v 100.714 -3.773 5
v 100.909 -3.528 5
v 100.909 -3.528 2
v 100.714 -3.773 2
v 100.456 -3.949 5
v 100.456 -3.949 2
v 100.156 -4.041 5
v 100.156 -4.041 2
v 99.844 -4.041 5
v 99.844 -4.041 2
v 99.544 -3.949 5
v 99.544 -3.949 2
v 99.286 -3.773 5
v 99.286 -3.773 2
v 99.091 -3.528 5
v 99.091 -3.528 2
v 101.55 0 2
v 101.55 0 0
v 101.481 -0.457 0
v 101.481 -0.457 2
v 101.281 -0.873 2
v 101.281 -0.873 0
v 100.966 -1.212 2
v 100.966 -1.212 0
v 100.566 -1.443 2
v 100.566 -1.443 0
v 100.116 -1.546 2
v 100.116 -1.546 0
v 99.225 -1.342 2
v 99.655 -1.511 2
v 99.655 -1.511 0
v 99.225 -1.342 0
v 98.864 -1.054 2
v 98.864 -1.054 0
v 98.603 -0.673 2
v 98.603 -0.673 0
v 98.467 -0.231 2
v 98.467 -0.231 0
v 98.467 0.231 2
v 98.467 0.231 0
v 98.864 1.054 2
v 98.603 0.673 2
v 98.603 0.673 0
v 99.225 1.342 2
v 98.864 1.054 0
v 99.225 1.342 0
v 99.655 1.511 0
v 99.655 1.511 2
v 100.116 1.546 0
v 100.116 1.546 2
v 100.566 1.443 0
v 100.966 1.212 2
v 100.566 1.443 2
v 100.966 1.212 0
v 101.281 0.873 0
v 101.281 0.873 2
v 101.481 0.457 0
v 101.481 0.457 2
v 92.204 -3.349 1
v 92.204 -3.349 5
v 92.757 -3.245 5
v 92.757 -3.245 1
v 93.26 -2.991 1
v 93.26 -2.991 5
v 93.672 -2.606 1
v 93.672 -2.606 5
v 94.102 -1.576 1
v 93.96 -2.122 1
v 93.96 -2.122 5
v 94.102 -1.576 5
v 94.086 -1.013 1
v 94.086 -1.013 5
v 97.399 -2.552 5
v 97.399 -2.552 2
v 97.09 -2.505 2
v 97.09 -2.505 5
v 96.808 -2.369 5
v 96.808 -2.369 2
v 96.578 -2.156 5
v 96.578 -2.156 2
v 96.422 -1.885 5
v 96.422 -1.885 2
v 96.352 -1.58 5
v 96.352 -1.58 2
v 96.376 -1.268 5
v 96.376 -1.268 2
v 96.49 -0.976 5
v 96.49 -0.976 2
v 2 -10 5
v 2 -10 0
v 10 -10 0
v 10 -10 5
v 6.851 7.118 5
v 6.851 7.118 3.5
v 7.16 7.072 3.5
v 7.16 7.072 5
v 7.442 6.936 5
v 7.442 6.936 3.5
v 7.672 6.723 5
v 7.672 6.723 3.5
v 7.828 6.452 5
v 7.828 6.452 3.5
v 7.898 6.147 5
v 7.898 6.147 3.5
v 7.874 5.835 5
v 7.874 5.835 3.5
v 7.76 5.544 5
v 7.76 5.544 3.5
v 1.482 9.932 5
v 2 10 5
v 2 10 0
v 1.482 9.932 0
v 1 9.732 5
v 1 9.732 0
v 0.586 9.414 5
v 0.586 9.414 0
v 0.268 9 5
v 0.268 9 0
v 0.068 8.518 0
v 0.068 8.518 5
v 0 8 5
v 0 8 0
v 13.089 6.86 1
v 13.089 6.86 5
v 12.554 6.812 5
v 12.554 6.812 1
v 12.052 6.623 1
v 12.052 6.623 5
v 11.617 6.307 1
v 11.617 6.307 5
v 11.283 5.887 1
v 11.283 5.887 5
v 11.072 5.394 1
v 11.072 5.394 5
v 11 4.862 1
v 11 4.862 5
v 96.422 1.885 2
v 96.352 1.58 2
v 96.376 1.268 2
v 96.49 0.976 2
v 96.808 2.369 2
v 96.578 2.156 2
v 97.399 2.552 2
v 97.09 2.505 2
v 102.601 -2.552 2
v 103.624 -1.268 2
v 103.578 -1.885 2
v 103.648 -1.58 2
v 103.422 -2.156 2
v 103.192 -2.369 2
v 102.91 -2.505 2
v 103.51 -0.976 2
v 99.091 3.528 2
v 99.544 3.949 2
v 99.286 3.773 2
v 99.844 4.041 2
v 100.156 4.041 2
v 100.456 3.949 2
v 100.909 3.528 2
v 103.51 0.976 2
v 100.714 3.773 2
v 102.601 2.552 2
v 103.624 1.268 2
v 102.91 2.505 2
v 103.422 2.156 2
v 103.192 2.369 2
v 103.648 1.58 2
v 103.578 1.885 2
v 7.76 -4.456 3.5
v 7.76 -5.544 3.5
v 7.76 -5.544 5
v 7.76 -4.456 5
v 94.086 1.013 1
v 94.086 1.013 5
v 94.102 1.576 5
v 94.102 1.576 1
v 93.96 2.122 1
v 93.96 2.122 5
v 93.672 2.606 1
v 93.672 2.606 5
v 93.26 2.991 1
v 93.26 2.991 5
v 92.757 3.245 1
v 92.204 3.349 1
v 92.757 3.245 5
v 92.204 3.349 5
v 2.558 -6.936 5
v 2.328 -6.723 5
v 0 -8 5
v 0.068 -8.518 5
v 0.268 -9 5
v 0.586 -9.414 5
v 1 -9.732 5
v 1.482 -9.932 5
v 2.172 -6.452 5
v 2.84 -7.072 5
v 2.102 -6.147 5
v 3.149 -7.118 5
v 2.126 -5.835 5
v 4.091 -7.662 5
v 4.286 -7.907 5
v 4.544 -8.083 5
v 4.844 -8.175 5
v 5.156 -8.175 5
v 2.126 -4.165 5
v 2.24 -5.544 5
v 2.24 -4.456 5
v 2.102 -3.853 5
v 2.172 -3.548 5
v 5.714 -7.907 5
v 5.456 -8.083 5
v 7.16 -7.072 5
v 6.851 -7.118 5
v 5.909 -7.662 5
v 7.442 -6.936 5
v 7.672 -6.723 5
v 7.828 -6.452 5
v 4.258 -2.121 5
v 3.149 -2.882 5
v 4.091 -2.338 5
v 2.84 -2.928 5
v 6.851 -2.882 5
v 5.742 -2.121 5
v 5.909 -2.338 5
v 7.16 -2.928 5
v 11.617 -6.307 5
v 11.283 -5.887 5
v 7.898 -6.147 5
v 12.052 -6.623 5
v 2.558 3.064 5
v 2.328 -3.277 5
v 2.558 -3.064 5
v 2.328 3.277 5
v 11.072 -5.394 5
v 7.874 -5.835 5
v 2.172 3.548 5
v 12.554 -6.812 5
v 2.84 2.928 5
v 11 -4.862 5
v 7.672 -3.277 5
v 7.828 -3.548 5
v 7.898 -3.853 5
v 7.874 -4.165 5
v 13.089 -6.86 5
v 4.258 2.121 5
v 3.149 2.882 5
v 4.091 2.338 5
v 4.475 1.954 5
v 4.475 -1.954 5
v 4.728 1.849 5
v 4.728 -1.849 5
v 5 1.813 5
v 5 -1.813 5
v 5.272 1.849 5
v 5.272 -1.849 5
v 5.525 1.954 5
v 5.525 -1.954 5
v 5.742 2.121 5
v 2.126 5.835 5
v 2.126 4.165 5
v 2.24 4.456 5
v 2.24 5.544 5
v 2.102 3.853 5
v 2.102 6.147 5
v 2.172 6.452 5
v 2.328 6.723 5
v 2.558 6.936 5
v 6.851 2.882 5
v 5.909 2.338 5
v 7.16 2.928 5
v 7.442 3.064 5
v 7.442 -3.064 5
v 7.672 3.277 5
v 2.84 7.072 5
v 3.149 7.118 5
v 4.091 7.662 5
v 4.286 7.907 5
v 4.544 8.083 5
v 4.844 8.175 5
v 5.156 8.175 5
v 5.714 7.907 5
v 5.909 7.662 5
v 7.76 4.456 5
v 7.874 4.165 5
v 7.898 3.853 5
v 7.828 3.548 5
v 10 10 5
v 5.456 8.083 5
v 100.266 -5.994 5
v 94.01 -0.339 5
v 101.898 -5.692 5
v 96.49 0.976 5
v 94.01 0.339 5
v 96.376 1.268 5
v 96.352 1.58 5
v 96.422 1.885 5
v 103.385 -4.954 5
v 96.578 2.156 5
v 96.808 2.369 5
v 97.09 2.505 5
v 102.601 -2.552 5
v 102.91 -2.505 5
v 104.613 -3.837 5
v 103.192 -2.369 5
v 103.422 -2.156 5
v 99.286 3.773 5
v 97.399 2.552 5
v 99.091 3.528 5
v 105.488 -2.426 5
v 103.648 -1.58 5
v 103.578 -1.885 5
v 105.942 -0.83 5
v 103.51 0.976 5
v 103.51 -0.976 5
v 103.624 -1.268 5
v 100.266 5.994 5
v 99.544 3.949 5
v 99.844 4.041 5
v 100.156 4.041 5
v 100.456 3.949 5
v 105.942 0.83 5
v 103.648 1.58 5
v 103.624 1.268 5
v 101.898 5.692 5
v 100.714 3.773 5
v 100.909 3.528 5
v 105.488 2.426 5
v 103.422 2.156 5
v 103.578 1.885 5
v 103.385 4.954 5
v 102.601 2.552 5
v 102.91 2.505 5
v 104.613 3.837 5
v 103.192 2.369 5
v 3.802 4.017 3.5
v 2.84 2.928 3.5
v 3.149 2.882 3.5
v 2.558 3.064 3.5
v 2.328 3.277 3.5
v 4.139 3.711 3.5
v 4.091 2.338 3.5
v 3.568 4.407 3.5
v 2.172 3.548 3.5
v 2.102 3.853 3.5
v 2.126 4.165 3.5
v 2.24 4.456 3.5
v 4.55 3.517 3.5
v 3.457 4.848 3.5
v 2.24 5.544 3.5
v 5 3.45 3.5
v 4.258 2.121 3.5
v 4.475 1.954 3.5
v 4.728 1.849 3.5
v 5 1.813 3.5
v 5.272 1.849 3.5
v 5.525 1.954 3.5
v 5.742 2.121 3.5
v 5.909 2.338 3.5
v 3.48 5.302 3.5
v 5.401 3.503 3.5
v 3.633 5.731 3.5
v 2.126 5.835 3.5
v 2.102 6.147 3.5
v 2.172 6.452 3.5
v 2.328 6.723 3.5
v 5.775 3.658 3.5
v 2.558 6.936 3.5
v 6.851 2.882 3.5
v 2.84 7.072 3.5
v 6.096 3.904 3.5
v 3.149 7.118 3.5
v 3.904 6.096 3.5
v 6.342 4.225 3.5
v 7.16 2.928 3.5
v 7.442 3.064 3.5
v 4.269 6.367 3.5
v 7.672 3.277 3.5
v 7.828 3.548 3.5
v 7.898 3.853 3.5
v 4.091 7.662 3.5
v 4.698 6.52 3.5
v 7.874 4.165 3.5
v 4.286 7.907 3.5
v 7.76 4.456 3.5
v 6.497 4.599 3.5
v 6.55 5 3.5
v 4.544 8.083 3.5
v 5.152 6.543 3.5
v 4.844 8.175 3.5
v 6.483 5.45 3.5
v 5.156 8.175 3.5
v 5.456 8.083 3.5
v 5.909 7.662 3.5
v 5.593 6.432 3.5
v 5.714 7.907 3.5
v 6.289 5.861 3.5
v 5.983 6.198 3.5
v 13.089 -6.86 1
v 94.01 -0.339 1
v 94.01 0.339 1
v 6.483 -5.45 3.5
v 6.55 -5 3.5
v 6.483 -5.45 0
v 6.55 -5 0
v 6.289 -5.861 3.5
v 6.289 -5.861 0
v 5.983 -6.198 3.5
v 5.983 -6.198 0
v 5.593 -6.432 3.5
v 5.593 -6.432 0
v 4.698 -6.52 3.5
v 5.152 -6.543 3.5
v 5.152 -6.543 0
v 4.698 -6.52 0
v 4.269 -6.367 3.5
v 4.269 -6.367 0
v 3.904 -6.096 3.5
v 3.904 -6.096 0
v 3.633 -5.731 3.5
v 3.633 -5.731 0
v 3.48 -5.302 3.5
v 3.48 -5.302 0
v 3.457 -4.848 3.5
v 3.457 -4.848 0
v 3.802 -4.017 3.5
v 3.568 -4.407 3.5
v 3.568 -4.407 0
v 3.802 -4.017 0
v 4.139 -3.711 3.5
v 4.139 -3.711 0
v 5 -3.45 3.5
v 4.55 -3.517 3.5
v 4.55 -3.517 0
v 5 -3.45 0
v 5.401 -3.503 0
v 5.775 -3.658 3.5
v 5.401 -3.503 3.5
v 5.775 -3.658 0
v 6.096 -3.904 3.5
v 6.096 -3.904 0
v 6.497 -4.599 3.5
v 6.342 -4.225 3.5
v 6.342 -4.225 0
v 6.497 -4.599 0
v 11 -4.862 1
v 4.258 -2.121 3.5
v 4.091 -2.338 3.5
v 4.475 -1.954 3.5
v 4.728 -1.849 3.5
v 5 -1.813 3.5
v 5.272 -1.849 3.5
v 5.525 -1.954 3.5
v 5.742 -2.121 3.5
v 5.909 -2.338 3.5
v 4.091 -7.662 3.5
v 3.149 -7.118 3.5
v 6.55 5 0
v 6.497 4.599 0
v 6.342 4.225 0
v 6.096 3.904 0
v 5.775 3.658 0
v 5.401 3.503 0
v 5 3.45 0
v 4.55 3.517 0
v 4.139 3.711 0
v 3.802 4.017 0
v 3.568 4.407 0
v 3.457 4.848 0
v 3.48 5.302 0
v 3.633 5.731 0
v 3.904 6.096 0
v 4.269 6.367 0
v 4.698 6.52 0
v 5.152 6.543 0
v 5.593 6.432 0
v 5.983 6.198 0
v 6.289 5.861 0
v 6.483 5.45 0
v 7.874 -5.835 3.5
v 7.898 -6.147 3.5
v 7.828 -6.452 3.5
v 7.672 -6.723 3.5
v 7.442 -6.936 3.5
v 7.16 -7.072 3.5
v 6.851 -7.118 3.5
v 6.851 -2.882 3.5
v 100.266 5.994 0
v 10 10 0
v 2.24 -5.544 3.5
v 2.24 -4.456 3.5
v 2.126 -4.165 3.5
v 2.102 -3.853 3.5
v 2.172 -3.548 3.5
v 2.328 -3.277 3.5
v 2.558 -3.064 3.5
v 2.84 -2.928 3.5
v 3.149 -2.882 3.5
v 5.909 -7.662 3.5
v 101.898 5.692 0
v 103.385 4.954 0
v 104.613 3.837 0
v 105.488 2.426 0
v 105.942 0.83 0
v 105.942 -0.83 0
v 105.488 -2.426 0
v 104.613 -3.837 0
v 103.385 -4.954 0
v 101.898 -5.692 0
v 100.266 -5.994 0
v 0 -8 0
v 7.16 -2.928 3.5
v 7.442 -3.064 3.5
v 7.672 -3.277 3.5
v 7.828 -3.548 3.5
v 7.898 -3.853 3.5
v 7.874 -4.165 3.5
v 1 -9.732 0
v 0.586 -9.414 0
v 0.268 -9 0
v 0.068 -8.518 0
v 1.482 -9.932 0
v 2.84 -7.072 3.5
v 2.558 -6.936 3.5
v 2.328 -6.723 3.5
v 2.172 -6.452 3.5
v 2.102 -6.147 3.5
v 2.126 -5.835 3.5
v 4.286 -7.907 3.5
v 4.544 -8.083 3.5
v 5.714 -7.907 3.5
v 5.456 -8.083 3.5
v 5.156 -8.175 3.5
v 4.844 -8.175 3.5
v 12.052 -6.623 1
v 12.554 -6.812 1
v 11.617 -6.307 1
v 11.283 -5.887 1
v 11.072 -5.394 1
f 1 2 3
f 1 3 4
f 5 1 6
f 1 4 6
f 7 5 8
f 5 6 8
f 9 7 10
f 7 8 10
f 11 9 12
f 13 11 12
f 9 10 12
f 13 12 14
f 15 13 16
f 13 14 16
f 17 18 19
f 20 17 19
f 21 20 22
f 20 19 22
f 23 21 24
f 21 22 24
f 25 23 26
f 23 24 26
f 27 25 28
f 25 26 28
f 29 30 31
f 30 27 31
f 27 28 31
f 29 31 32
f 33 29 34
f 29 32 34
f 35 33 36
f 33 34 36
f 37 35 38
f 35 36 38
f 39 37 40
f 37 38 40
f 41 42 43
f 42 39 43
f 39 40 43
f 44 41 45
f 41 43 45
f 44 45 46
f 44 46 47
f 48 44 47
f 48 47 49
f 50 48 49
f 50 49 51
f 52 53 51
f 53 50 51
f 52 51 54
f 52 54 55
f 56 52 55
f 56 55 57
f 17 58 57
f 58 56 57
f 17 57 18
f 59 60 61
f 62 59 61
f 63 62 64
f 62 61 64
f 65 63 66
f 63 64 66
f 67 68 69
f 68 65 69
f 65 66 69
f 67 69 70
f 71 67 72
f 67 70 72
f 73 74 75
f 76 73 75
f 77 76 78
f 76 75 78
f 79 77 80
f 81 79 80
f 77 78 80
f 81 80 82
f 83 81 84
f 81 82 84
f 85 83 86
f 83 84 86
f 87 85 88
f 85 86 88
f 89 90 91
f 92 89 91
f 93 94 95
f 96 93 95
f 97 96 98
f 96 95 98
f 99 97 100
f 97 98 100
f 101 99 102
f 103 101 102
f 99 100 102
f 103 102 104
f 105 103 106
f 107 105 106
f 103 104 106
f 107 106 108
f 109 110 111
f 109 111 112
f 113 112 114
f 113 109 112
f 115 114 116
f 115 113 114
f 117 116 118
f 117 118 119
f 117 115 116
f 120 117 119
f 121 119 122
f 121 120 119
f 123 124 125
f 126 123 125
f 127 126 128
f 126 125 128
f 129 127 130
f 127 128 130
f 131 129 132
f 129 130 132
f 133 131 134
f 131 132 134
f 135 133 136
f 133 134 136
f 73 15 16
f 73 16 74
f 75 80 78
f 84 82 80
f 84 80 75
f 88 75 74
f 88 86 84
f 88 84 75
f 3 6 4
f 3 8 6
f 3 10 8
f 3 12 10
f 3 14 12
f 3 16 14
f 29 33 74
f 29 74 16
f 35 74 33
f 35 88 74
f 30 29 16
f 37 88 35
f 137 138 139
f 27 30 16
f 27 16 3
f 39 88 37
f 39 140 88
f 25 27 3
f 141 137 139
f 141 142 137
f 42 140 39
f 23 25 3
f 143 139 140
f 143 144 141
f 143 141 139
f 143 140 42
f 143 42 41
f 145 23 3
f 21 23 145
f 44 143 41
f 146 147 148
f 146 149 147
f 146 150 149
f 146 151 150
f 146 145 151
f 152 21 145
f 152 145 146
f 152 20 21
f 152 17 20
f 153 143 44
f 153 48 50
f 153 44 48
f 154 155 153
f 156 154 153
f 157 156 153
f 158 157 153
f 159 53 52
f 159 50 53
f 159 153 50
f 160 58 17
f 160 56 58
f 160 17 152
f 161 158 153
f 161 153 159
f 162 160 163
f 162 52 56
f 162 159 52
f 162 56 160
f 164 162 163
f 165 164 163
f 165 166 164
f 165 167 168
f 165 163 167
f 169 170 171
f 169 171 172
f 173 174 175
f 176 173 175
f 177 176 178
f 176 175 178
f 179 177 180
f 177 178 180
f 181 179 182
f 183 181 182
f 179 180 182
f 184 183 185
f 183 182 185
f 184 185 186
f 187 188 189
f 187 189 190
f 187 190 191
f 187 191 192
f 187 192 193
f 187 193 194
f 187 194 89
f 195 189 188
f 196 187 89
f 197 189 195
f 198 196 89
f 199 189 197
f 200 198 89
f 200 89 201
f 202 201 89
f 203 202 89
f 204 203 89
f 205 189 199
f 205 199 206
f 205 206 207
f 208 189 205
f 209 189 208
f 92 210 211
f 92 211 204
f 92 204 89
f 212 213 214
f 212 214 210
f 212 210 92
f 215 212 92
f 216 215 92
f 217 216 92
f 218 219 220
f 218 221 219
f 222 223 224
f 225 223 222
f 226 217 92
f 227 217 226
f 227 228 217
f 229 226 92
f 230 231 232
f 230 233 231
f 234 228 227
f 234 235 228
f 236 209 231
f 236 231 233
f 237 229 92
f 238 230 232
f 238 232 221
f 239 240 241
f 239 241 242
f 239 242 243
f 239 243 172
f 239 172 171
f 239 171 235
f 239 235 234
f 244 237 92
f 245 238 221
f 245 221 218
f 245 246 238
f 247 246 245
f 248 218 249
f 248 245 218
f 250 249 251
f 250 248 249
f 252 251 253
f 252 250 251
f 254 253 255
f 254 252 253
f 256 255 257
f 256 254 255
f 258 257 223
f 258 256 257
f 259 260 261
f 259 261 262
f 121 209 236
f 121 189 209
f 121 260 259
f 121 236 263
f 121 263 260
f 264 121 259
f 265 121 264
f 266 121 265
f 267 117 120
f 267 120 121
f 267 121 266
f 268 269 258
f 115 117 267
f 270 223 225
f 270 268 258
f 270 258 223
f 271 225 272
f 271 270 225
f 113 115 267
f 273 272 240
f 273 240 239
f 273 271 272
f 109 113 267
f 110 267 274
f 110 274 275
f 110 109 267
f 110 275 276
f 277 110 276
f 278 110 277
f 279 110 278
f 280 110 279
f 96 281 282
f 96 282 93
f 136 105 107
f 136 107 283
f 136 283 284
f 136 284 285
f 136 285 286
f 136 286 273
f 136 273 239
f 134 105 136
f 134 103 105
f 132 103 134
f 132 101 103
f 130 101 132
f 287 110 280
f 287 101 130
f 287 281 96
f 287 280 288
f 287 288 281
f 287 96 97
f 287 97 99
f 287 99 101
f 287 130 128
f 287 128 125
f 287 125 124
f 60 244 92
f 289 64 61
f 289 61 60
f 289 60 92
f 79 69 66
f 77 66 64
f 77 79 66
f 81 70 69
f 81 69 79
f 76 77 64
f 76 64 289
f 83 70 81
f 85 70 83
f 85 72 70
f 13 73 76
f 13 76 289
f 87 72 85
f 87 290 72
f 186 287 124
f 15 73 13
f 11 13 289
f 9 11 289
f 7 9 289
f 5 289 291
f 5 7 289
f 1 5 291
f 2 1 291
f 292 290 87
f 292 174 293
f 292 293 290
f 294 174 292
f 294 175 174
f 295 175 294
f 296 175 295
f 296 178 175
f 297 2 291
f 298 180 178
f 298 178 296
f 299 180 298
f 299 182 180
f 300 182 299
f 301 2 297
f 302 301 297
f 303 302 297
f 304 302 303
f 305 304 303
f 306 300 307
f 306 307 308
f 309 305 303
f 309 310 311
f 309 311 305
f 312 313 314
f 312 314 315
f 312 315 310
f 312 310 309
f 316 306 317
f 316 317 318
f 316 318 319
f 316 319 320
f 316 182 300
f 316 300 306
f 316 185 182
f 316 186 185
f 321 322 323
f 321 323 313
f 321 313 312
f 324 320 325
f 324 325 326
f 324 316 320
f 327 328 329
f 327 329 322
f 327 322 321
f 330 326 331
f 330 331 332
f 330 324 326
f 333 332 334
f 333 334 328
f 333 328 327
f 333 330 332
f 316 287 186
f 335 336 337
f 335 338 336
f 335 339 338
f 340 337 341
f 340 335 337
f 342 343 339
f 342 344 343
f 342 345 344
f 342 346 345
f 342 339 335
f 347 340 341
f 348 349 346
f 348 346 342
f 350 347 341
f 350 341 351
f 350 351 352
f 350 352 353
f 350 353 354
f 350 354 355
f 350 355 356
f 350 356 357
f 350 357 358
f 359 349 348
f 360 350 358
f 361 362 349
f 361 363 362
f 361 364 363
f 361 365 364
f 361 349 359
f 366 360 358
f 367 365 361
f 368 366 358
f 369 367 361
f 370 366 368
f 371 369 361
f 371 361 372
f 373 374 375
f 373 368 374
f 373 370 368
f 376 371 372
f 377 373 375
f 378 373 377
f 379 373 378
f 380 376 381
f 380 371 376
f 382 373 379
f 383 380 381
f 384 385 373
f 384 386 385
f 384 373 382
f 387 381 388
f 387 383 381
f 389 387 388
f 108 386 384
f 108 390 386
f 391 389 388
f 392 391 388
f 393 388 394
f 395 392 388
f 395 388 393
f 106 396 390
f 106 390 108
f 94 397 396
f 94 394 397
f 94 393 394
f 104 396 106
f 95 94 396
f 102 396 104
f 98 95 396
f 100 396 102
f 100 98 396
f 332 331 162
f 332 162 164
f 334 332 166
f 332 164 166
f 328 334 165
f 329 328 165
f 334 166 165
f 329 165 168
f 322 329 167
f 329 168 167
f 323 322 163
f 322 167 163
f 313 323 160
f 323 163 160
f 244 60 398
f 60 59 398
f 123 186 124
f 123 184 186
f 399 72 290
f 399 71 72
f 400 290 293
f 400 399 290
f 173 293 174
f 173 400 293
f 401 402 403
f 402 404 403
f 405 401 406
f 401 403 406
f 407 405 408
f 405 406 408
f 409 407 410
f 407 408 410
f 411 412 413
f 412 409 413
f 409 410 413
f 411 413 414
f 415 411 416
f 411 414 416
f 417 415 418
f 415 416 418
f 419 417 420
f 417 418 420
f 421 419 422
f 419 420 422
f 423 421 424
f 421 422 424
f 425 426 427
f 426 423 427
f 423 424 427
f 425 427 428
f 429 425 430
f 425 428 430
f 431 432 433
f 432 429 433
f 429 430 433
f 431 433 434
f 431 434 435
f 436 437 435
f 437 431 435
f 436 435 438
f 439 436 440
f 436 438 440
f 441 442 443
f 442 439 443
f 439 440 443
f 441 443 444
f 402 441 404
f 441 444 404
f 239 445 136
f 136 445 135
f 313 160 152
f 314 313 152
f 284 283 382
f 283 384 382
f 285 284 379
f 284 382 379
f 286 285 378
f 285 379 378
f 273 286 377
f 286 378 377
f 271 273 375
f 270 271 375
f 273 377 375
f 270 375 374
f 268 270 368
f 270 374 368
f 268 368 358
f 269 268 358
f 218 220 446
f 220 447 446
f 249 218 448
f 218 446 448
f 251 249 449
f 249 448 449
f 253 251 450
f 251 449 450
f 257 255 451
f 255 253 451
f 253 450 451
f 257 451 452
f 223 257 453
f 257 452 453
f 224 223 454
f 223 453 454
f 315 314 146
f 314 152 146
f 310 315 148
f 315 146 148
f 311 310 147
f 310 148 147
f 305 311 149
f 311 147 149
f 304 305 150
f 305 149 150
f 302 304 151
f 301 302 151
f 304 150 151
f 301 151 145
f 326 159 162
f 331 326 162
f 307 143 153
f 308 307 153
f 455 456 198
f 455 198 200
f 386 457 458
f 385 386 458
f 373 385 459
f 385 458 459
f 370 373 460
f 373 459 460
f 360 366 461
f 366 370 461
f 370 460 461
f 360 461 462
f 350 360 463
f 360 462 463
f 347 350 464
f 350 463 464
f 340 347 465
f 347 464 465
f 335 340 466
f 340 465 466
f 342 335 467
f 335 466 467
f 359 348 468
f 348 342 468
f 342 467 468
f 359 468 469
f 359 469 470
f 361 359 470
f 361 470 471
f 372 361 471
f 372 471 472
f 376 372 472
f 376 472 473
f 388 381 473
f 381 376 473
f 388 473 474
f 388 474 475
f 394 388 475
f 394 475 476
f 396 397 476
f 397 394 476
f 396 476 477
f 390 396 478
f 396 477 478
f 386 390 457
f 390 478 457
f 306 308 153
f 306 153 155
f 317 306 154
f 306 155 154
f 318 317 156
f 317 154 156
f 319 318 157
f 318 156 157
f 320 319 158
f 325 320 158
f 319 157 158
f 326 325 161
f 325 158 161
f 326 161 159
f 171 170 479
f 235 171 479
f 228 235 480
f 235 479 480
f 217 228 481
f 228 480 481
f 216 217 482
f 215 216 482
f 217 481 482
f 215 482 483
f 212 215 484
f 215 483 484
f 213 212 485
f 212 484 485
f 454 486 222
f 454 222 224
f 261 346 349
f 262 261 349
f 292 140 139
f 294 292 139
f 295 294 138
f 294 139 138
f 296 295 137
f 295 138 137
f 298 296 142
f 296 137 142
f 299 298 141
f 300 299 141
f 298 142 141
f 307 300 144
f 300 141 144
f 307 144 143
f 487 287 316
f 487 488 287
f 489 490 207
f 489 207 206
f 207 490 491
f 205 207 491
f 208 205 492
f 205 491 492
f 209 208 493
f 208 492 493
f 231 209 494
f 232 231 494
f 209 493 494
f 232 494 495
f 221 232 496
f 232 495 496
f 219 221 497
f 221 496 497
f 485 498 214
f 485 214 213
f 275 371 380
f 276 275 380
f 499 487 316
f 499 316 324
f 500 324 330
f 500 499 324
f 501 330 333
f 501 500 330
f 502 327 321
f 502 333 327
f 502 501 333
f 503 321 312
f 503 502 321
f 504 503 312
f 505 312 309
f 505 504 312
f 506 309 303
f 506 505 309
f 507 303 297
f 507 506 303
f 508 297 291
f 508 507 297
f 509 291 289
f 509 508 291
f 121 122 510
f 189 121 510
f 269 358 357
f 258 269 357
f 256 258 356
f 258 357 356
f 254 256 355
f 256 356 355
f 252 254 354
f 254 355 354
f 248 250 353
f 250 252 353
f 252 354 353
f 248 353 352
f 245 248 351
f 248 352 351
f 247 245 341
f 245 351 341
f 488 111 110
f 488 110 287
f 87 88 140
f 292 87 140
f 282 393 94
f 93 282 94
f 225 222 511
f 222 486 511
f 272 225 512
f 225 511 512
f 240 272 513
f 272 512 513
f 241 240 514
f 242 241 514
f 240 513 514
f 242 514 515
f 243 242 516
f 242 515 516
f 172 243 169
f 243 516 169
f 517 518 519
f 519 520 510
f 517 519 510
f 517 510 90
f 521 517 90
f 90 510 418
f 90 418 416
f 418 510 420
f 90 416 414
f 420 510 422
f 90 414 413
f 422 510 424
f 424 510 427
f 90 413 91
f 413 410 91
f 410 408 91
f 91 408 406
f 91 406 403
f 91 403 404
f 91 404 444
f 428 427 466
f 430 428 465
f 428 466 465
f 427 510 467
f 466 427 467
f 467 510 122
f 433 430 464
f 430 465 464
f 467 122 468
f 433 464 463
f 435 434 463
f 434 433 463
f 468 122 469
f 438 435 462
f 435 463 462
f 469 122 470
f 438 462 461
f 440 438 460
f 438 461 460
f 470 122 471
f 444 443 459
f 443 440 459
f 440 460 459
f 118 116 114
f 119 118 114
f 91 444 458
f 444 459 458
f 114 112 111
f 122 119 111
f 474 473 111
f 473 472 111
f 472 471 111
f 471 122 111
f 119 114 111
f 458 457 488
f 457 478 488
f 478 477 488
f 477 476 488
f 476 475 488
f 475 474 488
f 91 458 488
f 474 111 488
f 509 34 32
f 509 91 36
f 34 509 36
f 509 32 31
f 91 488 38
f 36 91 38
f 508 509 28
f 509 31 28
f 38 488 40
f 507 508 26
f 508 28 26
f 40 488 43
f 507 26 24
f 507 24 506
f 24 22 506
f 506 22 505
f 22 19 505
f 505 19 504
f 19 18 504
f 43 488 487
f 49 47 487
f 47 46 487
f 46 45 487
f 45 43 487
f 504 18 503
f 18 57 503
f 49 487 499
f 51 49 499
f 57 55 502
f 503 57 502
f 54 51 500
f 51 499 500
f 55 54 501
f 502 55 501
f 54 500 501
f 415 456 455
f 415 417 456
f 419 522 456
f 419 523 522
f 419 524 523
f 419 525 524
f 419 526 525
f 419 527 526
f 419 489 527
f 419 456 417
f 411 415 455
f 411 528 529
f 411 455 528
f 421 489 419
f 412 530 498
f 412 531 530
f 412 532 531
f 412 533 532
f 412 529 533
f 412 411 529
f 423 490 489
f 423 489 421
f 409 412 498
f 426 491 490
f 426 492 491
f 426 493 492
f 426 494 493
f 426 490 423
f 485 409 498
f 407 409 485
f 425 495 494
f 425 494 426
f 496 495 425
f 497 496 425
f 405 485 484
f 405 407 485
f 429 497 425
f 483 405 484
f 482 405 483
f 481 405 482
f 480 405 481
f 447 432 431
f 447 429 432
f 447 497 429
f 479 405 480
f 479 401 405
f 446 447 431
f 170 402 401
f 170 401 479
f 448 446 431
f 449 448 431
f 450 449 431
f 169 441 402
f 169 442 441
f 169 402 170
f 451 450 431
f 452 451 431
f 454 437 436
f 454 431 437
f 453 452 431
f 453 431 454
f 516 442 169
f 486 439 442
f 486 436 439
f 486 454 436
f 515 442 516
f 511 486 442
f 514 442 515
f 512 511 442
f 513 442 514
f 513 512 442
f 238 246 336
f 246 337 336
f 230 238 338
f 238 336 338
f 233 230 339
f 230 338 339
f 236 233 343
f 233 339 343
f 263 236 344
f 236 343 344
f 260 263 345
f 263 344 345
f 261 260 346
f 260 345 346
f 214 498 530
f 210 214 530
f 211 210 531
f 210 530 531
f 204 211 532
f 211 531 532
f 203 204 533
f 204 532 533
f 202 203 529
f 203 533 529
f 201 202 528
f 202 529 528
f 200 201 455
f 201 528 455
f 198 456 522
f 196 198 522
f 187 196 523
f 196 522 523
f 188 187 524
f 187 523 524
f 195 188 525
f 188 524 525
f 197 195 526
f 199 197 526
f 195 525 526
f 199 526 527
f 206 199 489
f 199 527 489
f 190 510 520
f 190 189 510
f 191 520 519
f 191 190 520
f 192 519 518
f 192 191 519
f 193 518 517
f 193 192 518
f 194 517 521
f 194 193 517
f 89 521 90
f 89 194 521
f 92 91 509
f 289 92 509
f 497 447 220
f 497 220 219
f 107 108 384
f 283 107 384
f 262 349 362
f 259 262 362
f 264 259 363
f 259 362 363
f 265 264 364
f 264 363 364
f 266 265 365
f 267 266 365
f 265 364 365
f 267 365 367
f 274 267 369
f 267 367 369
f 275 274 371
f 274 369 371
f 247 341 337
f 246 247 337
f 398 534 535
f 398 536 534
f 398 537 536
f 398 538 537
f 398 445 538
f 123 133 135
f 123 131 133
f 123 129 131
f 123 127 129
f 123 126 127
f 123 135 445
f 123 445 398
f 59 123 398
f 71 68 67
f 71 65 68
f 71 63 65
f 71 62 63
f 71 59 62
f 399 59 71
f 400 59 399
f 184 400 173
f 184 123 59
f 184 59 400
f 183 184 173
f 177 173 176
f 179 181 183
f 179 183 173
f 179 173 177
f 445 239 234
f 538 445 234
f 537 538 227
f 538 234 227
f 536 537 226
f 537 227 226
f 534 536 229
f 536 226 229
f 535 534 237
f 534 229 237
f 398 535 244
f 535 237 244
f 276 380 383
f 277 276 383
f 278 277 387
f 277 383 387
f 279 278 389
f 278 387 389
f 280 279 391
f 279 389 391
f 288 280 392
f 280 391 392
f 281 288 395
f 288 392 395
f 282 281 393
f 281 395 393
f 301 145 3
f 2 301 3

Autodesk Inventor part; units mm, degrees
ref_plane "YZ Plane" through (0, 0, 0) normal (1, 0, 0) x (0, 1, 0)
ref_plane "XZ Plane" through (0, 0, 0) normal (0, 1, 0) x (-1, 0, 0)
ref_plane "XY Plane" through (0, 0, 0) normal (0, 0, 1) x (1, 0, 0)
sketch "スケッチ1" plane through (0, 0, 0) normal (0, 0, 1) x (1, 0, 0)
  circle A0 centre (5, 5) radius 1.55
  circle A1 centre (5, -5) radius 1.55
  line L0 (0, 0) -> (100, 0) construction
  circle A2 centre (100, 0) radius 1.55
  line L1 (0, 10) -> (0, -10)
  line L2 (0, -10) -> (10, -10)
  line L3 (10, -10) -> (100.266, -5.9941)
  line L4 (10, 10) -> (100.266, 5.9941)
  arc A3 (100.266, -5.9941) -> (100.266, 5.9941) centre (100, 0) ccw
  line L5 (94.942, -3.2274) -> (11, -6.9527)
  line L6 (94.942, 3.2274) -> (11, 6.9527)
  arc A4 (94.942, 3.2274) -> (94.942, -3.2274) centre (100, 0) ccw
  line L7 (11, -6.9527) -> (11, 6.9527)
  line L8 (5, -5) -> (5, 5)
  line L9 (0, 10) -> (10, 10)
  line L10 (7.76, 6.5935) -> (7.76, 3.4065)
  line L11 (7.76, 3.4065) -> (5, 1.813)
  line L12 (5, 1.813) -> (2.24, 3.4065)
  line L13 (2.24, 3.4065) -> (2.24, 6.5935)
  line L14 (2.24, 6.5935) -> (5, 8.187)
  line L15 (5, 8.187) -> (7.76, 6.5935)
  arc A5 (4.0907, 2.338) -> (5.9093, 2.338) centre (5, 2.863) ccw
  arc A6 (6.8507, 2.8815) -> (7.76, 4.4565) centre (6.8507, 3.9315) ccw
  arc A7 (7.76, 5.5435) -> (6.8507, 7.1185) centre (6.8507, 6.0685) ccw
  arc A8 (5.9093, 7.662) -> (4.0907, 7.662) centre (5, 7.137) ccw
  arc A9 (3.1493, 7.1185) -> (2.24, 5.5435) centre (3.1493, 6.0685) ccw
  arc A10 (2.24, 4.4565) -> (3.1493, 2.8815) centre (3.1493, 3.9315) ccw
  line L16 (7.76, -6.5935) -> (7.76, -3.4065)
  line L17 (7.76, -3.4065) -> (5, -1.813)
  line L18 (5, -1.813) -> (2.24, -3.4065)
  line L19 (2.24, -3.4065) -> (2.24, -6.5935)
  line L20 (2.24, -6.5935) -> (5, -8.187)
  line L21 (5, -8.187) -> (7.76, -6.5935)
  arc A11 (5.9093, -2.338) -> (4.0907, -2.338) centre (5, -2.863) ccw
  arc A12 (7.76, -4.4565) -> (6.8507, -2.8815) centre (6.8507, -3.9315) ccw
  arc A13 (6.8507, -7.1185) -> (7.76, -5.5435) centre (6.8507, -6.0685) ccw
  arc A14 (4.0907, -7.662) -> (5.9093, -7.662) centre (5, -7.137) ccw
  arc A15 (2.24, -5.5435) -> (3.1493, -7.1185) centre (3.1493, -6.0685) ccw
  arc A16 (3.1493, -2.8815) -> (2.24, -4.4565) centre (3.1493, -3.9315) ccw
  circle A17 centre (100, 0) radius 1.55
  line L22 (103.51, 2.0265) -> (103.51, -2.0265)
  line L23 (103.51, -2.0265) -> (100, -4.053)
  line L24 (100, -4.053) -> (96.49, -2.0265)
  line L25 (96.49, -2.0265) -> (96.49, 2.0265)
  line L26 (96.49, 2.0265) -> (100, 4.053)
  line L27 (100, 4.053) -> (103.51, 2.0265)
  arc A18 (99.0907, -3.528) -> (100.9093, -3.528) centre (100, -3.003) ccw
  arc A19 (102.6007, -2.5515) -> (103.51, -0.9765) centre (102.6007, -1.5015) ccw
  arc A20 (103.51, 0.9765) -> (102.6007, 2.5515) centre (102.6007, 1.5015) ccw
  arc A21 (100.9093, 3.528) -> (99.0907, 3.528) centre (100, 3.003) ccw
  arc A22 (97.3993, 2.5515) -> (96.49, 0.9765) centre (97.3993, 1.5015) ccw
  arc A23 (96.49, -0.9765) -> (97.3993, -2.5515) centre (97.3993, -1.5015) ccw
  line L28 (100, 4.053) -> (100, -4.053) construction
  point P0 (5, 0)
  point P1 (7.76, 3.4065)
  point P2 (7.76, 6.5935)
  point P3 (5, 8.187)
  point P4 (2.24, 6.5935)
  point P5 (2.24, 3.4065)
  point P6 (3.1493, 7.1185)
  point P7 (4.0907, 7.662)
  point P8 (6.8507, 7.1185)
  point P9 (7.76, 5.5435)
  point P10 (7.76, 4.4565)
  point P11 (6.8507, 2.8815)
  point P12 (6.8507, -2.8815)
  point P13 (7.76, -5.5435)
  point P14 (6.8507, -7.1185)
  point P15 (3.1493, -7.1185)
  point P16 (2.24, -4.4565)
  point P17 (3.1493, -2.8815)
  point P18 (96.49, 2.0265)
  point P19 (96.49, -2.0265)
  point P20 (102.6007, -2.5515)
  point P21 (97.3993, -2.5515)
  point P22 (96.49, -0.9765)
  point P23 (96.49, 0.9765)
  point P24 (97.3993, 2.5515)
  point P25 (99.0907, 3.528)
  point P26 (100.9093, 3.528)
  point P27 (102.6007, 2.5515)
  point P28 (103.51, 0.9765)
  point P29 (103.51, -0.9765)
  dimension "d0" = 10
  dimension "d1" = 3.1
  dimension "d2" = 3.1
  dimension "d3" = 100
  dimension "d4" = 6
  dimension "d33" = 3
  dimension "d34" = 6
  dimension "d35" = 6
  dimension "d40" = 20
  dimension "d41" = 5
  dimension "d42" = 10
  dimension "d43" = 5.52
  dimension "d44" = 2.1
  dimension "d47" = 360
  dimension "d57" = 3.1
  dimension "d58" = 7.02
  dimension "d59" = 2.1
  dimension "d60" = 360
extrude "押し出し1" add sketch "スケッチ1" along normal blind 5 contours L9 L4 A3 L3 L2 L1
extrude "押し出し5" add sketch "スケッチ1" along normal blind 3.5 contours L12 L13 L14 L15 L10 L11 | L11 A5 | A11 L17 | L17 L16 L21 L20 L19 L18 | L18 A11 | A5 L12 | L11 A6 | A10 L12 | A12 L17 | L18 A16 | L10 A6 | A10 L13 | A12 L16 | L19 A16 | L10 A7 | A9 L13 | A13 L16 | L19 A15 | L15 A7 | A9 L14 | A13 L21 | L20 A15 | L15 A8 | A8 L14 | A14 L21 | L20 A14
extrude "押し出し6" add sketch "スケッチ1" along normal blind 2 contours A20 L22 | L22 L23 L24 L25 L26 L27 | L27 A20 | A19 L22 | L27 A21 | A19 L23 | L26 A21 | A18 L23 | L26 A22 | A18 L24 | L25 A22 | A23 L24 | L25 A23
extrude "押し出し7" add sketch "スケッチ1" along normal blind 1 contours L5 L7 L6 A4
fillet "フィレット2" radius 2 6 edges at (11, 6.9527, 3) (11, -6.9527, 3) (94.942, 3.2274, 3) (94.942, -3.2274, 3) (0, -10, 2.5) (0, 10, 2.5)
properties part number "胴体_サブフレーム_1_12" material "アセタール樹脂、黒"
